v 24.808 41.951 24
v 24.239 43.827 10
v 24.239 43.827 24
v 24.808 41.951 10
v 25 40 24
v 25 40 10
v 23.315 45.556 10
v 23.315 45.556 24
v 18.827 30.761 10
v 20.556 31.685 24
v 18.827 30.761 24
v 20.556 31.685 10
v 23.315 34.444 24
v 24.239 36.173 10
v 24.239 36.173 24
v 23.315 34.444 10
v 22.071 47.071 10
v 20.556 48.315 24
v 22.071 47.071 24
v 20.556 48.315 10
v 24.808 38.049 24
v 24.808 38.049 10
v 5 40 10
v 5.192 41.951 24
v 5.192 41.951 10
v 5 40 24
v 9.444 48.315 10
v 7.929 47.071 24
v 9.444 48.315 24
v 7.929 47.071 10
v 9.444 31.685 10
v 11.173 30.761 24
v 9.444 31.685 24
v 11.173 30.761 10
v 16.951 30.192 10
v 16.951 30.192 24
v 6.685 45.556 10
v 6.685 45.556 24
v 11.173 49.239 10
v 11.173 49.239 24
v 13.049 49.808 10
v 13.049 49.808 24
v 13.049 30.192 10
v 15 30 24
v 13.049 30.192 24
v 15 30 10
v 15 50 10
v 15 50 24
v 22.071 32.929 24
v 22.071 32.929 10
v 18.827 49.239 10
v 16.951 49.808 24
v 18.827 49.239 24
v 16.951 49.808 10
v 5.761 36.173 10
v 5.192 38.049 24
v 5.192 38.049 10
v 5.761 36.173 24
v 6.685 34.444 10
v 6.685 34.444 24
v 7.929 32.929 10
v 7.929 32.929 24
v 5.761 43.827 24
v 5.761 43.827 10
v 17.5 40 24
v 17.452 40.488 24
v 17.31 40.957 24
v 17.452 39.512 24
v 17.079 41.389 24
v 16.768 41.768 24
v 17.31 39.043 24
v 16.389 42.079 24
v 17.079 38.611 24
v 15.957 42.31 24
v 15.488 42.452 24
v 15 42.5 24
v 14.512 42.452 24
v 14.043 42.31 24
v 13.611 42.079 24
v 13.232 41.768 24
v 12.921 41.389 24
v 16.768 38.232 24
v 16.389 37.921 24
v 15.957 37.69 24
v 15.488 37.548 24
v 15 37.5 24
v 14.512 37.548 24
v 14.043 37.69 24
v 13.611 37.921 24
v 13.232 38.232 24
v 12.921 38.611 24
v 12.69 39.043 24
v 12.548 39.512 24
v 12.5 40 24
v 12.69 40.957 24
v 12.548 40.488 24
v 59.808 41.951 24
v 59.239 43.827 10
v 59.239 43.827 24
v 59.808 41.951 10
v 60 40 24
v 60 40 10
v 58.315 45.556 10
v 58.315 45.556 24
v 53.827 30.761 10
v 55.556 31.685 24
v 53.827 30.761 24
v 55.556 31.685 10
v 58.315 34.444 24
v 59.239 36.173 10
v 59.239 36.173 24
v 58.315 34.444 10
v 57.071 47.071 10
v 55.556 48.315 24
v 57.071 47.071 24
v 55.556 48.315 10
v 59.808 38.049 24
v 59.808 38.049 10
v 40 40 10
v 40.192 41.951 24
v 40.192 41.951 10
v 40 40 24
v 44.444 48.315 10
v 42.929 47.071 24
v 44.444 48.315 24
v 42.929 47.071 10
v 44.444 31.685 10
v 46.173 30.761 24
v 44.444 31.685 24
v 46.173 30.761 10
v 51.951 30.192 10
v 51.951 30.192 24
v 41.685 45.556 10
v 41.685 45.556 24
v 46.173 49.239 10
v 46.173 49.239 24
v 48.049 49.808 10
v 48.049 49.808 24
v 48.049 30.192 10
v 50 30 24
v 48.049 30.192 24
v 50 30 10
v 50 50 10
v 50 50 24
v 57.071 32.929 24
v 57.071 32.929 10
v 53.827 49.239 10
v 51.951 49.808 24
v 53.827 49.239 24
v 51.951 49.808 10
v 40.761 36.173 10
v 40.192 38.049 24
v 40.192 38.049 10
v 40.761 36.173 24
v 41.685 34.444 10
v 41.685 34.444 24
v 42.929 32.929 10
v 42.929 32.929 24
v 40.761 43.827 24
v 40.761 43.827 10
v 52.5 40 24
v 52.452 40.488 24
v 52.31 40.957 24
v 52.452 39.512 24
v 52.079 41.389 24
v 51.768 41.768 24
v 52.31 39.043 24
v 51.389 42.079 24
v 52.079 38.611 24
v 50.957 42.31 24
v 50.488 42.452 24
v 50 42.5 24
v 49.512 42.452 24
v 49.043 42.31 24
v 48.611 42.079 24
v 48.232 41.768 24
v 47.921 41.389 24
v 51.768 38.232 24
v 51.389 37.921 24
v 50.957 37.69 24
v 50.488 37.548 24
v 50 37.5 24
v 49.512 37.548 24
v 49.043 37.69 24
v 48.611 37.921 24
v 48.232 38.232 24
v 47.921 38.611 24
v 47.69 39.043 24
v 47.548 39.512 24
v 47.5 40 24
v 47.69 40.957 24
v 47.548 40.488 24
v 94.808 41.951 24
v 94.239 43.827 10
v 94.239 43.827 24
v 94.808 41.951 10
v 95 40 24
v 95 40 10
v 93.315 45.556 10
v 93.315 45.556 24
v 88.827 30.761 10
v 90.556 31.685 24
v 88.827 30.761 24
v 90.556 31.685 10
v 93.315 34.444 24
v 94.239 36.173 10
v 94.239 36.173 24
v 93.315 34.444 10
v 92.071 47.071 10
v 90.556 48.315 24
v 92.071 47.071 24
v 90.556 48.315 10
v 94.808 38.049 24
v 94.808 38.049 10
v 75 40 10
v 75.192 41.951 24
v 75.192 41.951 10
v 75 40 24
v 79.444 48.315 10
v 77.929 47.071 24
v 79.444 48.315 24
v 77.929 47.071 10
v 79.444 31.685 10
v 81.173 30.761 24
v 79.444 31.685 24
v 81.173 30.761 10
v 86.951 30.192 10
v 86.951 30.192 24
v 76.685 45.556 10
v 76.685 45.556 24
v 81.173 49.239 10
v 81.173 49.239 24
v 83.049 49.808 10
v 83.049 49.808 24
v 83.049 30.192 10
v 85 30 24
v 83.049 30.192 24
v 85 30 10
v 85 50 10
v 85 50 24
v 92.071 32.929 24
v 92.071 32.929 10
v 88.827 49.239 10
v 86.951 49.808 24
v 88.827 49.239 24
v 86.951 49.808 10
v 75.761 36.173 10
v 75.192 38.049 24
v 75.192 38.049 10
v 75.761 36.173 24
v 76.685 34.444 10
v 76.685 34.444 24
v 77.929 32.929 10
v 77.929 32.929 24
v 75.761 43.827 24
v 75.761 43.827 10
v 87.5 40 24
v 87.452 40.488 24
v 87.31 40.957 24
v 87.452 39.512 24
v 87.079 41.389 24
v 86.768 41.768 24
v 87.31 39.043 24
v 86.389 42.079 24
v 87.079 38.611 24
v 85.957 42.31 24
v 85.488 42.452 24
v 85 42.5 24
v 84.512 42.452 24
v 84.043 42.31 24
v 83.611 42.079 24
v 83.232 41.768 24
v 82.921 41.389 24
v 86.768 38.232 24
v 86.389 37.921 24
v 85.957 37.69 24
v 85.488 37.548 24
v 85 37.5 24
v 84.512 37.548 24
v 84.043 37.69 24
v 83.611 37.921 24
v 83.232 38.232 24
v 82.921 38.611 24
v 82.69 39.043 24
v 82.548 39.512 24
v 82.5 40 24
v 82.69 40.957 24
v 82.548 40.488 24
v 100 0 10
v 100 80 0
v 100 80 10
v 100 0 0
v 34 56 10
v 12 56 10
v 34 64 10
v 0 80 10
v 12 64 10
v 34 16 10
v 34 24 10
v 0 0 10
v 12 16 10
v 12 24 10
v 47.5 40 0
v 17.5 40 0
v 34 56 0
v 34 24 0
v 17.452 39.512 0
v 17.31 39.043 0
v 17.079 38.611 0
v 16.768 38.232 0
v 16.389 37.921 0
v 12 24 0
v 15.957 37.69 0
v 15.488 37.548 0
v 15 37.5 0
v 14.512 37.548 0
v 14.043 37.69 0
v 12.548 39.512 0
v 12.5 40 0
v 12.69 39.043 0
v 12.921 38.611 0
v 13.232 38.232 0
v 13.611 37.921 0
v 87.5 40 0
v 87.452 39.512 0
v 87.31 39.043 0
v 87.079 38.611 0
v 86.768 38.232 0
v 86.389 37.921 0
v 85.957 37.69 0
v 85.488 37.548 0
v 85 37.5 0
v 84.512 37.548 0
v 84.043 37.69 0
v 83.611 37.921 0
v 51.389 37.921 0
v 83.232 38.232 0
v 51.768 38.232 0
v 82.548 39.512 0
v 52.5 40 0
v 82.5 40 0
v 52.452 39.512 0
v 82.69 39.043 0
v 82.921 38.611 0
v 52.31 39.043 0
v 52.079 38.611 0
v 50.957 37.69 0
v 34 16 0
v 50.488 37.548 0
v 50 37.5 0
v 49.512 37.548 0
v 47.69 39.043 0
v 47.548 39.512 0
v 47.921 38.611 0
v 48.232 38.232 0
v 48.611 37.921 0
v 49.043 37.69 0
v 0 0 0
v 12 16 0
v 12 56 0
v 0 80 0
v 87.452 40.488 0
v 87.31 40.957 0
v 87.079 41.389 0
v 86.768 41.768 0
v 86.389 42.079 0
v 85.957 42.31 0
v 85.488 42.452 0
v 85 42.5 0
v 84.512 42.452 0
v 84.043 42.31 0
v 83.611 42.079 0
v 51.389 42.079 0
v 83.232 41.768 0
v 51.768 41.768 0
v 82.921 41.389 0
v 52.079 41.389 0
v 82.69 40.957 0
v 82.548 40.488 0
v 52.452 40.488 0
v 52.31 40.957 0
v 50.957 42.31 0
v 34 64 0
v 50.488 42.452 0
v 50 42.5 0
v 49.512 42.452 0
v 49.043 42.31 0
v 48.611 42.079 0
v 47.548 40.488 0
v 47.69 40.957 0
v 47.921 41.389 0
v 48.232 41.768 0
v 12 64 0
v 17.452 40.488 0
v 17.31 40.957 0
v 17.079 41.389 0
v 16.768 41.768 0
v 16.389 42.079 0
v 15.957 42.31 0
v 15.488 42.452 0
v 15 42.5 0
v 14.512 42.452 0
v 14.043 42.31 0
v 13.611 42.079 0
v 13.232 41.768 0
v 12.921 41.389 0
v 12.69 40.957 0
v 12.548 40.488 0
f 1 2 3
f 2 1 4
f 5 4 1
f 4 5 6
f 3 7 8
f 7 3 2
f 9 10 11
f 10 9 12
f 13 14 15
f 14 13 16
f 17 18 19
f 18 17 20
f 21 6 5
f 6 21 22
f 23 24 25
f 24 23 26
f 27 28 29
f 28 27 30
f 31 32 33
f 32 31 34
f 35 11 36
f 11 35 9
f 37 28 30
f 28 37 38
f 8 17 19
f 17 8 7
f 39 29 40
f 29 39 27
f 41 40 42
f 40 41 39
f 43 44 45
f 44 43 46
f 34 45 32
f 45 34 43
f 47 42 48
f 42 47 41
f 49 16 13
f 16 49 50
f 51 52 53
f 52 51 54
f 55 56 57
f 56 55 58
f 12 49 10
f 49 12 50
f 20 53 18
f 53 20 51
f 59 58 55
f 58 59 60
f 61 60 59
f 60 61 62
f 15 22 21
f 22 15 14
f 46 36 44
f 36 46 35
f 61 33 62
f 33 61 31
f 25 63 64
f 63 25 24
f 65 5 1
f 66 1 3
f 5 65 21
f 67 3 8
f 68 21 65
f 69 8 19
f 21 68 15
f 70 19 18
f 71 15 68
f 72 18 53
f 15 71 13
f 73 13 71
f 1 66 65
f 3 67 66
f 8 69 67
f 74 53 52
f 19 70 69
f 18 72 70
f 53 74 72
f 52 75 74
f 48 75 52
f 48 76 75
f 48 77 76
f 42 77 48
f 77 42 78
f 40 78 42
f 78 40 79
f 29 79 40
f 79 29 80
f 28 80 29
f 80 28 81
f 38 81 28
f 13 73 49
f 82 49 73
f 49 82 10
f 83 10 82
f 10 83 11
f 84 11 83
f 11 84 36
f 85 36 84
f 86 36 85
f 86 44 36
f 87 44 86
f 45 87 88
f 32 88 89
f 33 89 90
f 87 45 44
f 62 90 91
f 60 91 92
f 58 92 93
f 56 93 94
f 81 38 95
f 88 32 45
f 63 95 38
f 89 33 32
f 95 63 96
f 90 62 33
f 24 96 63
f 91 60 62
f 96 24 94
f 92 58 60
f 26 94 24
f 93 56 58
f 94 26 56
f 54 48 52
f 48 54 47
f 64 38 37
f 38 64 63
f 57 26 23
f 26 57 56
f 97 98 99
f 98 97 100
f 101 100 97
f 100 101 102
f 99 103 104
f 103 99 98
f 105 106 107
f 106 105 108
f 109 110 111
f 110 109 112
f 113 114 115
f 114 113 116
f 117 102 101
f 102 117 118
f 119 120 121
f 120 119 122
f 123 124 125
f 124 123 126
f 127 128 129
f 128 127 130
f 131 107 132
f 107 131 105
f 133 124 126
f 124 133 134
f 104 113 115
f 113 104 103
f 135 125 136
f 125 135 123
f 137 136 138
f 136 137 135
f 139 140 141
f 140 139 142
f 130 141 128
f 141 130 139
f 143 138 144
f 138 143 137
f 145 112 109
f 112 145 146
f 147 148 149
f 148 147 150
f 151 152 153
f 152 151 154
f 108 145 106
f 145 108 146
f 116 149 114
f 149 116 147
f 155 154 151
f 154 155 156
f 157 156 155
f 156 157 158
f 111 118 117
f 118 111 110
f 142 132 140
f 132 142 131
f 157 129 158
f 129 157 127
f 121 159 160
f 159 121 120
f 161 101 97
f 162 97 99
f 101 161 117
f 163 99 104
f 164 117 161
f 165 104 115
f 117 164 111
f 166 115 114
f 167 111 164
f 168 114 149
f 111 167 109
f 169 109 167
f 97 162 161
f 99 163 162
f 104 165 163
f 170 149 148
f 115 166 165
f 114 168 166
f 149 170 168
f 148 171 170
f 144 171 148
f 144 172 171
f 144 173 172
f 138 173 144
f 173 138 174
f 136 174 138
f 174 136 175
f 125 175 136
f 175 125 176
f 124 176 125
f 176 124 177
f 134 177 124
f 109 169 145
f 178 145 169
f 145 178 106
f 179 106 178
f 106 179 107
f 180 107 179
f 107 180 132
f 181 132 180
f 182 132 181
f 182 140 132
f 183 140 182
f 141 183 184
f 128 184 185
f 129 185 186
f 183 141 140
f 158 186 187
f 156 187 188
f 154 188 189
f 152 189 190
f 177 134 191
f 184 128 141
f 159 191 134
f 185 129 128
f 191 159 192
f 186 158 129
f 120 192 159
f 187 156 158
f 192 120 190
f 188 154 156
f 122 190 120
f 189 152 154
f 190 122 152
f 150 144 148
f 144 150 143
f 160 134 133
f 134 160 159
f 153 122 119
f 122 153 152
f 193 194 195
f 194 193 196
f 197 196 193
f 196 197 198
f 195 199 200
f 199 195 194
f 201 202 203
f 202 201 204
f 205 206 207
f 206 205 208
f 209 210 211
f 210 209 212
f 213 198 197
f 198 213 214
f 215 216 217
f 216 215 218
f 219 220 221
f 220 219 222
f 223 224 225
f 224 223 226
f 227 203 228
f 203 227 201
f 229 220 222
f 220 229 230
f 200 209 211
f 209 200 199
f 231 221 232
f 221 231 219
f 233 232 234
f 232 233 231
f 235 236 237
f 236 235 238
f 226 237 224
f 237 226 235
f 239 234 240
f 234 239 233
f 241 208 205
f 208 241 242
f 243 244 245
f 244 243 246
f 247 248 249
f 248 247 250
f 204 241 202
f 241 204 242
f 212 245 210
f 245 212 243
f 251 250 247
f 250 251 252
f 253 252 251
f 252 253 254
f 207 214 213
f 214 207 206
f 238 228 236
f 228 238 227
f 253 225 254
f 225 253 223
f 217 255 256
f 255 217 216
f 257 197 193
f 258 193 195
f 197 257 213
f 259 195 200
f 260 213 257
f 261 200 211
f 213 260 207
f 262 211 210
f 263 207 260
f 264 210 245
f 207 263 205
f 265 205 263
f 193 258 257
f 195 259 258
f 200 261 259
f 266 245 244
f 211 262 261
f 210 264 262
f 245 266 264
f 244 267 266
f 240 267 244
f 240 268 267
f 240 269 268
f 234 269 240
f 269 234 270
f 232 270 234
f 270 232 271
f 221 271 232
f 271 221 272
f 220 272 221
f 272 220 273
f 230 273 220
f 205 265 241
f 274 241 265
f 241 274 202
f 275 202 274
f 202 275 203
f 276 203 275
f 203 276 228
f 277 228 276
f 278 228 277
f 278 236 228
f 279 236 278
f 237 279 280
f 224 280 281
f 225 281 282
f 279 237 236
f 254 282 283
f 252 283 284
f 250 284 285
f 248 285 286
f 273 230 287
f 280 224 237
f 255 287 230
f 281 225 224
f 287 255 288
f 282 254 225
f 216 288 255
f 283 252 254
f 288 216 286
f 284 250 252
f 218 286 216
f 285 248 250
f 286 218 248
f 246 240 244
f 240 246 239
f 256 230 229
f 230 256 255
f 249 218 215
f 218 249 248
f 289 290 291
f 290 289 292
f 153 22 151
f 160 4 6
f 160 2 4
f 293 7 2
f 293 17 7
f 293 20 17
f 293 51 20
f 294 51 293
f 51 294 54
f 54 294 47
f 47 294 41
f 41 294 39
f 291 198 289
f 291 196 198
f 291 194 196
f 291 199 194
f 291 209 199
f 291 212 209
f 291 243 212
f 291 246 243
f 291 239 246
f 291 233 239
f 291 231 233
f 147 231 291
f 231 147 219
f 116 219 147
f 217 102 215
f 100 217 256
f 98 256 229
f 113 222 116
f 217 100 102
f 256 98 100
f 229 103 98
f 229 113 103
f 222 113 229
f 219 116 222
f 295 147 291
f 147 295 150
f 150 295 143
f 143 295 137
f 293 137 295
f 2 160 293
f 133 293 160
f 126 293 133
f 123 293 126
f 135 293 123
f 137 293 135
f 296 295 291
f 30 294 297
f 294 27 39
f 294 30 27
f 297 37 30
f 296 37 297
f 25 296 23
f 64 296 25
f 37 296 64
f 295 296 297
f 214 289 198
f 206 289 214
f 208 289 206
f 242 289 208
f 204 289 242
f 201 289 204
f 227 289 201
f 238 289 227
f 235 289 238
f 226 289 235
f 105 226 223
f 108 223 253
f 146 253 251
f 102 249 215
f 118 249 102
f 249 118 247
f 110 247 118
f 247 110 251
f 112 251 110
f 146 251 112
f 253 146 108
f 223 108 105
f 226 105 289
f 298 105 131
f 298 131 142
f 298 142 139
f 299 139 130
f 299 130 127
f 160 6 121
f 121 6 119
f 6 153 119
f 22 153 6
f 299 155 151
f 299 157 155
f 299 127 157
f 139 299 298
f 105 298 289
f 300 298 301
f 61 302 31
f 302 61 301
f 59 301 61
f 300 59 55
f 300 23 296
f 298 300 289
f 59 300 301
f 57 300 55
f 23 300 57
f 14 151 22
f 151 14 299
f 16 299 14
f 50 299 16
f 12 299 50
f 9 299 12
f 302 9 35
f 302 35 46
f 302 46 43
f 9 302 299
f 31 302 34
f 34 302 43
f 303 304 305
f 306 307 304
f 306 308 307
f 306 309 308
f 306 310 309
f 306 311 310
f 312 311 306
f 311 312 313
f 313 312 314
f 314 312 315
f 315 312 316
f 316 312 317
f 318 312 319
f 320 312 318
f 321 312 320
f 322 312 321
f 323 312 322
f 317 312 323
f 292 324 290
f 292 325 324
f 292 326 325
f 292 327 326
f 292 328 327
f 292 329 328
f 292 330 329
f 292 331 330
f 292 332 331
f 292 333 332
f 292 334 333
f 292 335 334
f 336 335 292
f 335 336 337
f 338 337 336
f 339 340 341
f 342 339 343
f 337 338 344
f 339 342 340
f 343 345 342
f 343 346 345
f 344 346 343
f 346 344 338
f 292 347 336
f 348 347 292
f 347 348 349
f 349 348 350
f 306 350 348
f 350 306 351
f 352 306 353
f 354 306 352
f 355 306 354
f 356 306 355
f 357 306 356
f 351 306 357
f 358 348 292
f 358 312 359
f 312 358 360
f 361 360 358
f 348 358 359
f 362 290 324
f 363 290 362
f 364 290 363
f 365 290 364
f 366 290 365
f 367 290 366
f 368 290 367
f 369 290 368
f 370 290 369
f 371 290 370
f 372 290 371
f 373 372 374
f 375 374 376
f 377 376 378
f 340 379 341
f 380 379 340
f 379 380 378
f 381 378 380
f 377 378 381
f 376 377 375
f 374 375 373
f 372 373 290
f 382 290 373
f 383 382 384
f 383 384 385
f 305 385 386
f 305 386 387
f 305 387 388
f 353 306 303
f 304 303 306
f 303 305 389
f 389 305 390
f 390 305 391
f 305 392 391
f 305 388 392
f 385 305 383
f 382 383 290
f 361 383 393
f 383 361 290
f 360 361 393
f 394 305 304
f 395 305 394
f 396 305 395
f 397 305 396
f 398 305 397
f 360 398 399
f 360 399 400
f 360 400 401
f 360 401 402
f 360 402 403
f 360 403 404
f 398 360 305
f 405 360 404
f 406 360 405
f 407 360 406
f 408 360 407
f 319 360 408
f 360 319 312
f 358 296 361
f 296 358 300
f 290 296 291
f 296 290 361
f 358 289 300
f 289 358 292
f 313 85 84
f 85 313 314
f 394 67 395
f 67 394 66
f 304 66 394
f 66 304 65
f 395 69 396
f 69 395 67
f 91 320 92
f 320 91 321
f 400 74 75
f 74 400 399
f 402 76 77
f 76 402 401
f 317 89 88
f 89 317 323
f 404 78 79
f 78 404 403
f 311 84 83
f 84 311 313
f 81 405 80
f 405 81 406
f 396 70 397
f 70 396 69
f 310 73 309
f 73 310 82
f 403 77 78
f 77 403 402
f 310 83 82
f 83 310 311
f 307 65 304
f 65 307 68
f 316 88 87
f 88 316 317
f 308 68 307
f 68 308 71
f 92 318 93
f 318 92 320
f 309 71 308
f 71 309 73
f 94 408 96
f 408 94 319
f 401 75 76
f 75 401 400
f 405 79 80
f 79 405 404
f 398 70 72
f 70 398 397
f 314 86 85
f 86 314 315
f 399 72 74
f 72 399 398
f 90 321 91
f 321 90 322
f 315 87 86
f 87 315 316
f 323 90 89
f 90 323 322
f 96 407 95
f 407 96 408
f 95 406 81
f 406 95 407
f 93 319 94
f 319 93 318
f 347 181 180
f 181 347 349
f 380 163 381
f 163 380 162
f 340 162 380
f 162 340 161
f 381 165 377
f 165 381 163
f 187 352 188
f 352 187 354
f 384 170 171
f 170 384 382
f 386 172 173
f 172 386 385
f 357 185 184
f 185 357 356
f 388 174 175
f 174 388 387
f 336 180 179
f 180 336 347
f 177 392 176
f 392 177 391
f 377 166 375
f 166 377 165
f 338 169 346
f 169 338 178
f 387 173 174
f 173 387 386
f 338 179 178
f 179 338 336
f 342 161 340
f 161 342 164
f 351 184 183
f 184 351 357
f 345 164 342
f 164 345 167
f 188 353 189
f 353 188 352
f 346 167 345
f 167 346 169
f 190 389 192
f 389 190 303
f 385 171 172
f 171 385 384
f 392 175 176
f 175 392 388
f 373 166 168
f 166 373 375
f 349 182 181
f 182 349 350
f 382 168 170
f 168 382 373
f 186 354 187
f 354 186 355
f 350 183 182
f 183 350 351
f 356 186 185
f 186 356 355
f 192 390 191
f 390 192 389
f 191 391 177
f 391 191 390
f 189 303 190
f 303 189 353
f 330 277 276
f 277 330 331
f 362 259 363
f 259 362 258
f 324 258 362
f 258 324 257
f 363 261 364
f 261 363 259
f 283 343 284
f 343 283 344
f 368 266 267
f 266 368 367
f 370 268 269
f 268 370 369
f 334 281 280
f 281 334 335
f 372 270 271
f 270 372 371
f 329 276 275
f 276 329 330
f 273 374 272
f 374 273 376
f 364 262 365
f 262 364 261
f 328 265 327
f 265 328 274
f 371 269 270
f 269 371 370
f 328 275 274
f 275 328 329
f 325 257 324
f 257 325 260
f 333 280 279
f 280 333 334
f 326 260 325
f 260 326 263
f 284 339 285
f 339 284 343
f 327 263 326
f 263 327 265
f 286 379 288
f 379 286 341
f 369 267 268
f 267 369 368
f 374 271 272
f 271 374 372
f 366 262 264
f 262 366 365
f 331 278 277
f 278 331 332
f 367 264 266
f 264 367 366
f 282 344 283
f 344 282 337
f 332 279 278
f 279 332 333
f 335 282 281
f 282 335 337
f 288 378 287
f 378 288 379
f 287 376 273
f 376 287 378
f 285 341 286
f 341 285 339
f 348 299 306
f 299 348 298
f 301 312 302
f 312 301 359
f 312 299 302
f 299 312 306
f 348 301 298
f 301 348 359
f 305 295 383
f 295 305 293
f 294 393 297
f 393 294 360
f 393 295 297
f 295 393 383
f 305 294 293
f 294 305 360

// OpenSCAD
$fn = 32;

// ----------------------------------------------------------------------
// Drill jig: three_boss_slot jig
// ----------------------------------------------------------------------

// --- parameters (mm) ---
plate_l = 100;            // plate length, X
plate_w = 80;             // plate width, Y
plate_t = 10;             // plate thickness
boss_d = 20;              // guide boss diameter
boss_h = 15;              // boss height above the plate
guide_d = 5;              // guide hole diameter
boss_pitch = 35;          // boss pitch
slot_w = 8;               // clamp slot width
slot_l = 22;              // clamp slot length
slot_x = 12;              // slot start X

n_boss = 3;  // guide bosses
boss_x0 = (plate_l - (n_boss - 1) * boss_pitch) / 2;  // first boss X
boss_top = plate_t - 1 + boss_h;  // boss crown height
total_h = boss_top;  // overall height

difference() {
  union() {
  cube([plate_l, plate_w, plate_t]);
  for (i = [0 : n_boss - 1])
    translate([boss_x0 + i * boss_pitch, plate_w / 2, plate_t - 1])
      cylinder(h = boss_h, d = boss_d);
  }
  for (i = [0 : n_boss - 1])
    translate([boss_x0 + i * boss_pitch, plate_w / 2, -1])
      cylinder(h = plate_t + boss_h, d = guide_d);
  for (cy = [plate_w * 0.25, plate_w * 0.75])
    translate([slot_x, cy - slot_w / 2, -1])
      cube([slot_l, slot_w, plate_t + 2]);
}
